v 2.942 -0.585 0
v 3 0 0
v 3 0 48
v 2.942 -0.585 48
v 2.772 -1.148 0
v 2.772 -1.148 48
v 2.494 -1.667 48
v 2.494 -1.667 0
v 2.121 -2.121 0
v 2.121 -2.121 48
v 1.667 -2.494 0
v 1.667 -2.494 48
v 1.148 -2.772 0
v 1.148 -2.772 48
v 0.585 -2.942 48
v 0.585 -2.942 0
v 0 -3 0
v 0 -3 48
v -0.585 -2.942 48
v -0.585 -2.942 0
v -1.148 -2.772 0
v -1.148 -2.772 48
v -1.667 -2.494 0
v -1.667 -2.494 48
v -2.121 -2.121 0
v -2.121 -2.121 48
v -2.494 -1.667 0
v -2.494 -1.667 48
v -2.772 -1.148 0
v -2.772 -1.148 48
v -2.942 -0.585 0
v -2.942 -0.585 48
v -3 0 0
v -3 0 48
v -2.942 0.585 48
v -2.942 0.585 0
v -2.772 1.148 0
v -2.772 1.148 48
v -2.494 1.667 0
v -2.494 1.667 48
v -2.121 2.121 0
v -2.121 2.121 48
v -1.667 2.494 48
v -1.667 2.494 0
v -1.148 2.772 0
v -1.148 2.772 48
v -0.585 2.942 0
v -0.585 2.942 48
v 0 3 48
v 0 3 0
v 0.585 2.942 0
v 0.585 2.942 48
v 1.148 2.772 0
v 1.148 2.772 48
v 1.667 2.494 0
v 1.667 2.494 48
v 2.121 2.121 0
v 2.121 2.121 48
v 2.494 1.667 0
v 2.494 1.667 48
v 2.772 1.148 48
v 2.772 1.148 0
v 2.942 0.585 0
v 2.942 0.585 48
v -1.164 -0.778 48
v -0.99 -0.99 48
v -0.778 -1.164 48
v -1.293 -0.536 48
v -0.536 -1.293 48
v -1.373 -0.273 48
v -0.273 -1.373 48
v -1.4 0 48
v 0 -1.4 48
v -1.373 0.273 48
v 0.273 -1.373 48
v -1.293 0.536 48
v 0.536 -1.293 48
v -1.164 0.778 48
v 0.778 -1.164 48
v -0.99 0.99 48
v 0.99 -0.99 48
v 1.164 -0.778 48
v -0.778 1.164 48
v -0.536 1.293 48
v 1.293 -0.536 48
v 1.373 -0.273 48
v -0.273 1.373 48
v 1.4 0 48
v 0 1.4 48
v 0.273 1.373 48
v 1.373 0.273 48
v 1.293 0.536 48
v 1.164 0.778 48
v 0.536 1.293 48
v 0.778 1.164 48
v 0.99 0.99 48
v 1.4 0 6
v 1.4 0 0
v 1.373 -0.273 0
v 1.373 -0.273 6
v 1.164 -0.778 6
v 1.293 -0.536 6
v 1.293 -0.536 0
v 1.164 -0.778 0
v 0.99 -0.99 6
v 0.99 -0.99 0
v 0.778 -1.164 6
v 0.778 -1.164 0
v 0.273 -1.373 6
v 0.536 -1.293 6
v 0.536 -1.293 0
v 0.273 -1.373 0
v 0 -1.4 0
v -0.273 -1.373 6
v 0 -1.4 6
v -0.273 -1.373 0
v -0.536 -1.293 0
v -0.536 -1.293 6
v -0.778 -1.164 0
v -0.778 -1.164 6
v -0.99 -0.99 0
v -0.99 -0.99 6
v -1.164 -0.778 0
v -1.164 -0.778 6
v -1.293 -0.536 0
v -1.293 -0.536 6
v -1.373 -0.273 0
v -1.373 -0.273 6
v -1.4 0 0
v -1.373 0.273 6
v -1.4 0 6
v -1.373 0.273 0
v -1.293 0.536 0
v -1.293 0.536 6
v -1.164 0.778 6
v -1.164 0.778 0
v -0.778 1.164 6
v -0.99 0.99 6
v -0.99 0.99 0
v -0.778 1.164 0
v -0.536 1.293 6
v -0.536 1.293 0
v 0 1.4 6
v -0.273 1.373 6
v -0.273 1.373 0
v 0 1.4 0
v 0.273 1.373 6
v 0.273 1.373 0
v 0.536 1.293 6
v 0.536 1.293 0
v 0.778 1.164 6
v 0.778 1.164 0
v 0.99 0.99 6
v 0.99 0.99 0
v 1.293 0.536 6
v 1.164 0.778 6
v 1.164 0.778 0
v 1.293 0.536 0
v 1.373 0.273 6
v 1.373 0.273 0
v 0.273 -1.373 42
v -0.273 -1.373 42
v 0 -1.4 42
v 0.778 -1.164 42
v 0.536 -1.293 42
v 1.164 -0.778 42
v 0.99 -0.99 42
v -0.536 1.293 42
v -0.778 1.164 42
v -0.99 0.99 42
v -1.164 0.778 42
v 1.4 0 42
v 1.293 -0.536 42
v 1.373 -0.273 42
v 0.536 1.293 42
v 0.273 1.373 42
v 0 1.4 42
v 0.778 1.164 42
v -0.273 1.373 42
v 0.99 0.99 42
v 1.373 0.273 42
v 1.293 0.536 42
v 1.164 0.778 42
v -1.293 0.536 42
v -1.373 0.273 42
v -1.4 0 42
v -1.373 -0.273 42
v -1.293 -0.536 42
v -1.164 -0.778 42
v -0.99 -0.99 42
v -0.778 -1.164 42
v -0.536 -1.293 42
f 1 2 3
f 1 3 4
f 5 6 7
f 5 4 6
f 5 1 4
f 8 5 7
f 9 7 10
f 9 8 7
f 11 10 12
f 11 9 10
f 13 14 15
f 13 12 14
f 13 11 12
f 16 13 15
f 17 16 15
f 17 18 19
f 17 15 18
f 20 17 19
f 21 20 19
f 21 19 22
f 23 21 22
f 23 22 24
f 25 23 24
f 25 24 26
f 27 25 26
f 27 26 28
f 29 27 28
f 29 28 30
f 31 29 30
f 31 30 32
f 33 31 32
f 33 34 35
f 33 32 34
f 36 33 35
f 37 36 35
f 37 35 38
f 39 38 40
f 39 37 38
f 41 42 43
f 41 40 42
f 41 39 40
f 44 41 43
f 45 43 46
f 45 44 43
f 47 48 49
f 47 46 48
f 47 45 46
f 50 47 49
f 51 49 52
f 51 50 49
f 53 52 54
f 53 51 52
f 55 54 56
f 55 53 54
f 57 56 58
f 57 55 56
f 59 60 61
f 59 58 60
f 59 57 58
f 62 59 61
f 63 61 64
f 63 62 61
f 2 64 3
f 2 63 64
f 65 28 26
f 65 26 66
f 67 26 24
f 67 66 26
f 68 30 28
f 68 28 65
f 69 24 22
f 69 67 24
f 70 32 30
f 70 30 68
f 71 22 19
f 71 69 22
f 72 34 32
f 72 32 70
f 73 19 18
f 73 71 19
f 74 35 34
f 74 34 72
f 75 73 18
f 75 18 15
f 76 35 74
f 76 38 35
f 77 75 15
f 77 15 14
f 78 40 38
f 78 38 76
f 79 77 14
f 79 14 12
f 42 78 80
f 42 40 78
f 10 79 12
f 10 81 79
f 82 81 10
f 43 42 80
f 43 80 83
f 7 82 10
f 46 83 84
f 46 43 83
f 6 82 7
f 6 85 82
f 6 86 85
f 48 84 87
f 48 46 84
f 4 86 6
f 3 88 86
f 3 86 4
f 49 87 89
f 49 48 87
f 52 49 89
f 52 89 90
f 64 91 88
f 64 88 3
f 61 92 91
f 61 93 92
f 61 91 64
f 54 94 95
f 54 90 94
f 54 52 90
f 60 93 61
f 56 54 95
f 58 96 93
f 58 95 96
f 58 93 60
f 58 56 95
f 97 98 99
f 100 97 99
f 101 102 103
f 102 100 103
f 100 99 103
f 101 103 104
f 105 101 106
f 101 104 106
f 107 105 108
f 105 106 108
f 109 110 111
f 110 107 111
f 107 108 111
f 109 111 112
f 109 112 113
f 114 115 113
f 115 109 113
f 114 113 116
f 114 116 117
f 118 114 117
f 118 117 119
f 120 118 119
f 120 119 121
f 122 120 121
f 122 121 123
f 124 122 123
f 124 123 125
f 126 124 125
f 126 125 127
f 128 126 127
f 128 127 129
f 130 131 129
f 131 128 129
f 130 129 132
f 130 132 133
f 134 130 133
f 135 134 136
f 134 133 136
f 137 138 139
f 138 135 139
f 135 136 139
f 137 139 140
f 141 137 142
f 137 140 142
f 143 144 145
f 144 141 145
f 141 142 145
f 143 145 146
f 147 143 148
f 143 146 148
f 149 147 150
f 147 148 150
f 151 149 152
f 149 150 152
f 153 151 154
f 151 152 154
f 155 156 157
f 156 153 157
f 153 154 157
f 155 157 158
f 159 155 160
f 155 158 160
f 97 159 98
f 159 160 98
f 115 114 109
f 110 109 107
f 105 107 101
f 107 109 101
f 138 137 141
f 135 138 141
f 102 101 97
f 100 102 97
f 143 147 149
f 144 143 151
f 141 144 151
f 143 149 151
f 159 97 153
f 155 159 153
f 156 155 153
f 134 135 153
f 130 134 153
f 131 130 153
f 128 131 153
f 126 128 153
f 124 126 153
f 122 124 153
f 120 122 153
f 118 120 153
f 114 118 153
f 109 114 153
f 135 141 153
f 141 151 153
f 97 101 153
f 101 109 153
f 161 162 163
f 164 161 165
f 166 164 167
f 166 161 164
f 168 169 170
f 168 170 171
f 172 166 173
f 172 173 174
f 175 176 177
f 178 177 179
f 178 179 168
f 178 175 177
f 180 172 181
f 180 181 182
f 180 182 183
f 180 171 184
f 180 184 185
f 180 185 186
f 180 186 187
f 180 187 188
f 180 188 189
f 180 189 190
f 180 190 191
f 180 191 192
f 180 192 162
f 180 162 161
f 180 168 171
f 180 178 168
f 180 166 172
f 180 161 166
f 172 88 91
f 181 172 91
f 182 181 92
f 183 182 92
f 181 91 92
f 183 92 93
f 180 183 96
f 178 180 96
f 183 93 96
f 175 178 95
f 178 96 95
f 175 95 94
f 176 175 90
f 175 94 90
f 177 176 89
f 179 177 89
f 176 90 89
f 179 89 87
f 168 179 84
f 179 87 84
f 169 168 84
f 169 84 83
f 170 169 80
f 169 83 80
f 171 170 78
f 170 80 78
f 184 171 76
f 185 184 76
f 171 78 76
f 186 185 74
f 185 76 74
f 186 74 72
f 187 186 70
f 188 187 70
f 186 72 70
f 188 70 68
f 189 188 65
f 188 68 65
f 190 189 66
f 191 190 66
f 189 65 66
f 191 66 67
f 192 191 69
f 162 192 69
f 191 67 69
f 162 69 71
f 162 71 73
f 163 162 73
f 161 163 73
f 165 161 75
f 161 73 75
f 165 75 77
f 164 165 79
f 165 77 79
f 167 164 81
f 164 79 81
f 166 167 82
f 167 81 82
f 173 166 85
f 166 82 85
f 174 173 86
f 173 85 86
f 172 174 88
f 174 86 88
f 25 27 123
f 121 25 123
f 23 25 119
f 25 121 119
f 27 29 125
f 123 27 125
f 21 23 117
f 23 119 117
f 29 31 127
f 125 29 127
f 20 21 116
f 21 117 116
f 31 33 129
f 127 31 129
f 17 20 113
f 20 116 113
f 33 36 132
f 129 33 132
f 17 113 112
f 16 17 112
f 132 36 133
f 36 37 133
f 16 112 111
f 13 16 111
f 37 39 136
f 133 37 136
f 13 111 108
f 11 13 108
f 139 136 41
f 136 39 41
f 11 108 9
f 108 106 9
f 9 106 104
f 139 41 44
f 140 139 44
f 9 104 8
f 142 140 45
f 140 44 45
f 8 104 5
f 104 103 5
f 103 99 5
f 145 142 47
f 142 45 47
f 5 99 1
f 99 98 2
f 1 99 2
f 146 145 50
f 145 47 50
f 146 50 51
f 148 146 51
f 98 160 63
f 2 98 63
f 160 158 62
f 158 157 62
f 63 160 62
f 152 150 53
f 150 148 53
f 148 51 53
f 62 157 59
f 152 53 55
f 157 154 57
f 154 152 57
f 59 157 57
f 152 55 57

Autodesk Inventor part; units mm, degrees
ref_plane "YZ Plane" through (0, 0, 0) normal (1, 0, 0) x (0, 1, 0)
ref_plane "XZ Plane" through (0, 0, 0) normal (0, 1, 0) x (-1, 0, 0)
ref_plane "XY Plane" through (0, 0, 0) normal (0, 0, 1) x (1, 0, 0)
sketch "スケッチ1" plane through (0, 0, 0) normal (0, 0, 1) x (1, 0, 0)
  circle A0 centre (0, 0) radius 1.4
  circle A1 centre (0, 0) radius 3
  dimension "d0" = 2.8
  dimension "d1" = 6
extrude "押し出し1" add sketch "スケッチ1" along normal blind 48 contours A0 | A1
sketch "スケッチ2" plane through (0, 0, 48) normal (0, 0, 1) x (1, 0, 0)
  circle A0 centre (0, 0) radius 1.4
  dimension "d4" = 2.8
extrude "押し出し2" cut sketch "スケッチ2" against normal blind 6
extrude "押し出し3" cut sketch "スケッチ1" along normal blind 6 contours A0
properties part number "40mm" material "アルミニウム 6061"
